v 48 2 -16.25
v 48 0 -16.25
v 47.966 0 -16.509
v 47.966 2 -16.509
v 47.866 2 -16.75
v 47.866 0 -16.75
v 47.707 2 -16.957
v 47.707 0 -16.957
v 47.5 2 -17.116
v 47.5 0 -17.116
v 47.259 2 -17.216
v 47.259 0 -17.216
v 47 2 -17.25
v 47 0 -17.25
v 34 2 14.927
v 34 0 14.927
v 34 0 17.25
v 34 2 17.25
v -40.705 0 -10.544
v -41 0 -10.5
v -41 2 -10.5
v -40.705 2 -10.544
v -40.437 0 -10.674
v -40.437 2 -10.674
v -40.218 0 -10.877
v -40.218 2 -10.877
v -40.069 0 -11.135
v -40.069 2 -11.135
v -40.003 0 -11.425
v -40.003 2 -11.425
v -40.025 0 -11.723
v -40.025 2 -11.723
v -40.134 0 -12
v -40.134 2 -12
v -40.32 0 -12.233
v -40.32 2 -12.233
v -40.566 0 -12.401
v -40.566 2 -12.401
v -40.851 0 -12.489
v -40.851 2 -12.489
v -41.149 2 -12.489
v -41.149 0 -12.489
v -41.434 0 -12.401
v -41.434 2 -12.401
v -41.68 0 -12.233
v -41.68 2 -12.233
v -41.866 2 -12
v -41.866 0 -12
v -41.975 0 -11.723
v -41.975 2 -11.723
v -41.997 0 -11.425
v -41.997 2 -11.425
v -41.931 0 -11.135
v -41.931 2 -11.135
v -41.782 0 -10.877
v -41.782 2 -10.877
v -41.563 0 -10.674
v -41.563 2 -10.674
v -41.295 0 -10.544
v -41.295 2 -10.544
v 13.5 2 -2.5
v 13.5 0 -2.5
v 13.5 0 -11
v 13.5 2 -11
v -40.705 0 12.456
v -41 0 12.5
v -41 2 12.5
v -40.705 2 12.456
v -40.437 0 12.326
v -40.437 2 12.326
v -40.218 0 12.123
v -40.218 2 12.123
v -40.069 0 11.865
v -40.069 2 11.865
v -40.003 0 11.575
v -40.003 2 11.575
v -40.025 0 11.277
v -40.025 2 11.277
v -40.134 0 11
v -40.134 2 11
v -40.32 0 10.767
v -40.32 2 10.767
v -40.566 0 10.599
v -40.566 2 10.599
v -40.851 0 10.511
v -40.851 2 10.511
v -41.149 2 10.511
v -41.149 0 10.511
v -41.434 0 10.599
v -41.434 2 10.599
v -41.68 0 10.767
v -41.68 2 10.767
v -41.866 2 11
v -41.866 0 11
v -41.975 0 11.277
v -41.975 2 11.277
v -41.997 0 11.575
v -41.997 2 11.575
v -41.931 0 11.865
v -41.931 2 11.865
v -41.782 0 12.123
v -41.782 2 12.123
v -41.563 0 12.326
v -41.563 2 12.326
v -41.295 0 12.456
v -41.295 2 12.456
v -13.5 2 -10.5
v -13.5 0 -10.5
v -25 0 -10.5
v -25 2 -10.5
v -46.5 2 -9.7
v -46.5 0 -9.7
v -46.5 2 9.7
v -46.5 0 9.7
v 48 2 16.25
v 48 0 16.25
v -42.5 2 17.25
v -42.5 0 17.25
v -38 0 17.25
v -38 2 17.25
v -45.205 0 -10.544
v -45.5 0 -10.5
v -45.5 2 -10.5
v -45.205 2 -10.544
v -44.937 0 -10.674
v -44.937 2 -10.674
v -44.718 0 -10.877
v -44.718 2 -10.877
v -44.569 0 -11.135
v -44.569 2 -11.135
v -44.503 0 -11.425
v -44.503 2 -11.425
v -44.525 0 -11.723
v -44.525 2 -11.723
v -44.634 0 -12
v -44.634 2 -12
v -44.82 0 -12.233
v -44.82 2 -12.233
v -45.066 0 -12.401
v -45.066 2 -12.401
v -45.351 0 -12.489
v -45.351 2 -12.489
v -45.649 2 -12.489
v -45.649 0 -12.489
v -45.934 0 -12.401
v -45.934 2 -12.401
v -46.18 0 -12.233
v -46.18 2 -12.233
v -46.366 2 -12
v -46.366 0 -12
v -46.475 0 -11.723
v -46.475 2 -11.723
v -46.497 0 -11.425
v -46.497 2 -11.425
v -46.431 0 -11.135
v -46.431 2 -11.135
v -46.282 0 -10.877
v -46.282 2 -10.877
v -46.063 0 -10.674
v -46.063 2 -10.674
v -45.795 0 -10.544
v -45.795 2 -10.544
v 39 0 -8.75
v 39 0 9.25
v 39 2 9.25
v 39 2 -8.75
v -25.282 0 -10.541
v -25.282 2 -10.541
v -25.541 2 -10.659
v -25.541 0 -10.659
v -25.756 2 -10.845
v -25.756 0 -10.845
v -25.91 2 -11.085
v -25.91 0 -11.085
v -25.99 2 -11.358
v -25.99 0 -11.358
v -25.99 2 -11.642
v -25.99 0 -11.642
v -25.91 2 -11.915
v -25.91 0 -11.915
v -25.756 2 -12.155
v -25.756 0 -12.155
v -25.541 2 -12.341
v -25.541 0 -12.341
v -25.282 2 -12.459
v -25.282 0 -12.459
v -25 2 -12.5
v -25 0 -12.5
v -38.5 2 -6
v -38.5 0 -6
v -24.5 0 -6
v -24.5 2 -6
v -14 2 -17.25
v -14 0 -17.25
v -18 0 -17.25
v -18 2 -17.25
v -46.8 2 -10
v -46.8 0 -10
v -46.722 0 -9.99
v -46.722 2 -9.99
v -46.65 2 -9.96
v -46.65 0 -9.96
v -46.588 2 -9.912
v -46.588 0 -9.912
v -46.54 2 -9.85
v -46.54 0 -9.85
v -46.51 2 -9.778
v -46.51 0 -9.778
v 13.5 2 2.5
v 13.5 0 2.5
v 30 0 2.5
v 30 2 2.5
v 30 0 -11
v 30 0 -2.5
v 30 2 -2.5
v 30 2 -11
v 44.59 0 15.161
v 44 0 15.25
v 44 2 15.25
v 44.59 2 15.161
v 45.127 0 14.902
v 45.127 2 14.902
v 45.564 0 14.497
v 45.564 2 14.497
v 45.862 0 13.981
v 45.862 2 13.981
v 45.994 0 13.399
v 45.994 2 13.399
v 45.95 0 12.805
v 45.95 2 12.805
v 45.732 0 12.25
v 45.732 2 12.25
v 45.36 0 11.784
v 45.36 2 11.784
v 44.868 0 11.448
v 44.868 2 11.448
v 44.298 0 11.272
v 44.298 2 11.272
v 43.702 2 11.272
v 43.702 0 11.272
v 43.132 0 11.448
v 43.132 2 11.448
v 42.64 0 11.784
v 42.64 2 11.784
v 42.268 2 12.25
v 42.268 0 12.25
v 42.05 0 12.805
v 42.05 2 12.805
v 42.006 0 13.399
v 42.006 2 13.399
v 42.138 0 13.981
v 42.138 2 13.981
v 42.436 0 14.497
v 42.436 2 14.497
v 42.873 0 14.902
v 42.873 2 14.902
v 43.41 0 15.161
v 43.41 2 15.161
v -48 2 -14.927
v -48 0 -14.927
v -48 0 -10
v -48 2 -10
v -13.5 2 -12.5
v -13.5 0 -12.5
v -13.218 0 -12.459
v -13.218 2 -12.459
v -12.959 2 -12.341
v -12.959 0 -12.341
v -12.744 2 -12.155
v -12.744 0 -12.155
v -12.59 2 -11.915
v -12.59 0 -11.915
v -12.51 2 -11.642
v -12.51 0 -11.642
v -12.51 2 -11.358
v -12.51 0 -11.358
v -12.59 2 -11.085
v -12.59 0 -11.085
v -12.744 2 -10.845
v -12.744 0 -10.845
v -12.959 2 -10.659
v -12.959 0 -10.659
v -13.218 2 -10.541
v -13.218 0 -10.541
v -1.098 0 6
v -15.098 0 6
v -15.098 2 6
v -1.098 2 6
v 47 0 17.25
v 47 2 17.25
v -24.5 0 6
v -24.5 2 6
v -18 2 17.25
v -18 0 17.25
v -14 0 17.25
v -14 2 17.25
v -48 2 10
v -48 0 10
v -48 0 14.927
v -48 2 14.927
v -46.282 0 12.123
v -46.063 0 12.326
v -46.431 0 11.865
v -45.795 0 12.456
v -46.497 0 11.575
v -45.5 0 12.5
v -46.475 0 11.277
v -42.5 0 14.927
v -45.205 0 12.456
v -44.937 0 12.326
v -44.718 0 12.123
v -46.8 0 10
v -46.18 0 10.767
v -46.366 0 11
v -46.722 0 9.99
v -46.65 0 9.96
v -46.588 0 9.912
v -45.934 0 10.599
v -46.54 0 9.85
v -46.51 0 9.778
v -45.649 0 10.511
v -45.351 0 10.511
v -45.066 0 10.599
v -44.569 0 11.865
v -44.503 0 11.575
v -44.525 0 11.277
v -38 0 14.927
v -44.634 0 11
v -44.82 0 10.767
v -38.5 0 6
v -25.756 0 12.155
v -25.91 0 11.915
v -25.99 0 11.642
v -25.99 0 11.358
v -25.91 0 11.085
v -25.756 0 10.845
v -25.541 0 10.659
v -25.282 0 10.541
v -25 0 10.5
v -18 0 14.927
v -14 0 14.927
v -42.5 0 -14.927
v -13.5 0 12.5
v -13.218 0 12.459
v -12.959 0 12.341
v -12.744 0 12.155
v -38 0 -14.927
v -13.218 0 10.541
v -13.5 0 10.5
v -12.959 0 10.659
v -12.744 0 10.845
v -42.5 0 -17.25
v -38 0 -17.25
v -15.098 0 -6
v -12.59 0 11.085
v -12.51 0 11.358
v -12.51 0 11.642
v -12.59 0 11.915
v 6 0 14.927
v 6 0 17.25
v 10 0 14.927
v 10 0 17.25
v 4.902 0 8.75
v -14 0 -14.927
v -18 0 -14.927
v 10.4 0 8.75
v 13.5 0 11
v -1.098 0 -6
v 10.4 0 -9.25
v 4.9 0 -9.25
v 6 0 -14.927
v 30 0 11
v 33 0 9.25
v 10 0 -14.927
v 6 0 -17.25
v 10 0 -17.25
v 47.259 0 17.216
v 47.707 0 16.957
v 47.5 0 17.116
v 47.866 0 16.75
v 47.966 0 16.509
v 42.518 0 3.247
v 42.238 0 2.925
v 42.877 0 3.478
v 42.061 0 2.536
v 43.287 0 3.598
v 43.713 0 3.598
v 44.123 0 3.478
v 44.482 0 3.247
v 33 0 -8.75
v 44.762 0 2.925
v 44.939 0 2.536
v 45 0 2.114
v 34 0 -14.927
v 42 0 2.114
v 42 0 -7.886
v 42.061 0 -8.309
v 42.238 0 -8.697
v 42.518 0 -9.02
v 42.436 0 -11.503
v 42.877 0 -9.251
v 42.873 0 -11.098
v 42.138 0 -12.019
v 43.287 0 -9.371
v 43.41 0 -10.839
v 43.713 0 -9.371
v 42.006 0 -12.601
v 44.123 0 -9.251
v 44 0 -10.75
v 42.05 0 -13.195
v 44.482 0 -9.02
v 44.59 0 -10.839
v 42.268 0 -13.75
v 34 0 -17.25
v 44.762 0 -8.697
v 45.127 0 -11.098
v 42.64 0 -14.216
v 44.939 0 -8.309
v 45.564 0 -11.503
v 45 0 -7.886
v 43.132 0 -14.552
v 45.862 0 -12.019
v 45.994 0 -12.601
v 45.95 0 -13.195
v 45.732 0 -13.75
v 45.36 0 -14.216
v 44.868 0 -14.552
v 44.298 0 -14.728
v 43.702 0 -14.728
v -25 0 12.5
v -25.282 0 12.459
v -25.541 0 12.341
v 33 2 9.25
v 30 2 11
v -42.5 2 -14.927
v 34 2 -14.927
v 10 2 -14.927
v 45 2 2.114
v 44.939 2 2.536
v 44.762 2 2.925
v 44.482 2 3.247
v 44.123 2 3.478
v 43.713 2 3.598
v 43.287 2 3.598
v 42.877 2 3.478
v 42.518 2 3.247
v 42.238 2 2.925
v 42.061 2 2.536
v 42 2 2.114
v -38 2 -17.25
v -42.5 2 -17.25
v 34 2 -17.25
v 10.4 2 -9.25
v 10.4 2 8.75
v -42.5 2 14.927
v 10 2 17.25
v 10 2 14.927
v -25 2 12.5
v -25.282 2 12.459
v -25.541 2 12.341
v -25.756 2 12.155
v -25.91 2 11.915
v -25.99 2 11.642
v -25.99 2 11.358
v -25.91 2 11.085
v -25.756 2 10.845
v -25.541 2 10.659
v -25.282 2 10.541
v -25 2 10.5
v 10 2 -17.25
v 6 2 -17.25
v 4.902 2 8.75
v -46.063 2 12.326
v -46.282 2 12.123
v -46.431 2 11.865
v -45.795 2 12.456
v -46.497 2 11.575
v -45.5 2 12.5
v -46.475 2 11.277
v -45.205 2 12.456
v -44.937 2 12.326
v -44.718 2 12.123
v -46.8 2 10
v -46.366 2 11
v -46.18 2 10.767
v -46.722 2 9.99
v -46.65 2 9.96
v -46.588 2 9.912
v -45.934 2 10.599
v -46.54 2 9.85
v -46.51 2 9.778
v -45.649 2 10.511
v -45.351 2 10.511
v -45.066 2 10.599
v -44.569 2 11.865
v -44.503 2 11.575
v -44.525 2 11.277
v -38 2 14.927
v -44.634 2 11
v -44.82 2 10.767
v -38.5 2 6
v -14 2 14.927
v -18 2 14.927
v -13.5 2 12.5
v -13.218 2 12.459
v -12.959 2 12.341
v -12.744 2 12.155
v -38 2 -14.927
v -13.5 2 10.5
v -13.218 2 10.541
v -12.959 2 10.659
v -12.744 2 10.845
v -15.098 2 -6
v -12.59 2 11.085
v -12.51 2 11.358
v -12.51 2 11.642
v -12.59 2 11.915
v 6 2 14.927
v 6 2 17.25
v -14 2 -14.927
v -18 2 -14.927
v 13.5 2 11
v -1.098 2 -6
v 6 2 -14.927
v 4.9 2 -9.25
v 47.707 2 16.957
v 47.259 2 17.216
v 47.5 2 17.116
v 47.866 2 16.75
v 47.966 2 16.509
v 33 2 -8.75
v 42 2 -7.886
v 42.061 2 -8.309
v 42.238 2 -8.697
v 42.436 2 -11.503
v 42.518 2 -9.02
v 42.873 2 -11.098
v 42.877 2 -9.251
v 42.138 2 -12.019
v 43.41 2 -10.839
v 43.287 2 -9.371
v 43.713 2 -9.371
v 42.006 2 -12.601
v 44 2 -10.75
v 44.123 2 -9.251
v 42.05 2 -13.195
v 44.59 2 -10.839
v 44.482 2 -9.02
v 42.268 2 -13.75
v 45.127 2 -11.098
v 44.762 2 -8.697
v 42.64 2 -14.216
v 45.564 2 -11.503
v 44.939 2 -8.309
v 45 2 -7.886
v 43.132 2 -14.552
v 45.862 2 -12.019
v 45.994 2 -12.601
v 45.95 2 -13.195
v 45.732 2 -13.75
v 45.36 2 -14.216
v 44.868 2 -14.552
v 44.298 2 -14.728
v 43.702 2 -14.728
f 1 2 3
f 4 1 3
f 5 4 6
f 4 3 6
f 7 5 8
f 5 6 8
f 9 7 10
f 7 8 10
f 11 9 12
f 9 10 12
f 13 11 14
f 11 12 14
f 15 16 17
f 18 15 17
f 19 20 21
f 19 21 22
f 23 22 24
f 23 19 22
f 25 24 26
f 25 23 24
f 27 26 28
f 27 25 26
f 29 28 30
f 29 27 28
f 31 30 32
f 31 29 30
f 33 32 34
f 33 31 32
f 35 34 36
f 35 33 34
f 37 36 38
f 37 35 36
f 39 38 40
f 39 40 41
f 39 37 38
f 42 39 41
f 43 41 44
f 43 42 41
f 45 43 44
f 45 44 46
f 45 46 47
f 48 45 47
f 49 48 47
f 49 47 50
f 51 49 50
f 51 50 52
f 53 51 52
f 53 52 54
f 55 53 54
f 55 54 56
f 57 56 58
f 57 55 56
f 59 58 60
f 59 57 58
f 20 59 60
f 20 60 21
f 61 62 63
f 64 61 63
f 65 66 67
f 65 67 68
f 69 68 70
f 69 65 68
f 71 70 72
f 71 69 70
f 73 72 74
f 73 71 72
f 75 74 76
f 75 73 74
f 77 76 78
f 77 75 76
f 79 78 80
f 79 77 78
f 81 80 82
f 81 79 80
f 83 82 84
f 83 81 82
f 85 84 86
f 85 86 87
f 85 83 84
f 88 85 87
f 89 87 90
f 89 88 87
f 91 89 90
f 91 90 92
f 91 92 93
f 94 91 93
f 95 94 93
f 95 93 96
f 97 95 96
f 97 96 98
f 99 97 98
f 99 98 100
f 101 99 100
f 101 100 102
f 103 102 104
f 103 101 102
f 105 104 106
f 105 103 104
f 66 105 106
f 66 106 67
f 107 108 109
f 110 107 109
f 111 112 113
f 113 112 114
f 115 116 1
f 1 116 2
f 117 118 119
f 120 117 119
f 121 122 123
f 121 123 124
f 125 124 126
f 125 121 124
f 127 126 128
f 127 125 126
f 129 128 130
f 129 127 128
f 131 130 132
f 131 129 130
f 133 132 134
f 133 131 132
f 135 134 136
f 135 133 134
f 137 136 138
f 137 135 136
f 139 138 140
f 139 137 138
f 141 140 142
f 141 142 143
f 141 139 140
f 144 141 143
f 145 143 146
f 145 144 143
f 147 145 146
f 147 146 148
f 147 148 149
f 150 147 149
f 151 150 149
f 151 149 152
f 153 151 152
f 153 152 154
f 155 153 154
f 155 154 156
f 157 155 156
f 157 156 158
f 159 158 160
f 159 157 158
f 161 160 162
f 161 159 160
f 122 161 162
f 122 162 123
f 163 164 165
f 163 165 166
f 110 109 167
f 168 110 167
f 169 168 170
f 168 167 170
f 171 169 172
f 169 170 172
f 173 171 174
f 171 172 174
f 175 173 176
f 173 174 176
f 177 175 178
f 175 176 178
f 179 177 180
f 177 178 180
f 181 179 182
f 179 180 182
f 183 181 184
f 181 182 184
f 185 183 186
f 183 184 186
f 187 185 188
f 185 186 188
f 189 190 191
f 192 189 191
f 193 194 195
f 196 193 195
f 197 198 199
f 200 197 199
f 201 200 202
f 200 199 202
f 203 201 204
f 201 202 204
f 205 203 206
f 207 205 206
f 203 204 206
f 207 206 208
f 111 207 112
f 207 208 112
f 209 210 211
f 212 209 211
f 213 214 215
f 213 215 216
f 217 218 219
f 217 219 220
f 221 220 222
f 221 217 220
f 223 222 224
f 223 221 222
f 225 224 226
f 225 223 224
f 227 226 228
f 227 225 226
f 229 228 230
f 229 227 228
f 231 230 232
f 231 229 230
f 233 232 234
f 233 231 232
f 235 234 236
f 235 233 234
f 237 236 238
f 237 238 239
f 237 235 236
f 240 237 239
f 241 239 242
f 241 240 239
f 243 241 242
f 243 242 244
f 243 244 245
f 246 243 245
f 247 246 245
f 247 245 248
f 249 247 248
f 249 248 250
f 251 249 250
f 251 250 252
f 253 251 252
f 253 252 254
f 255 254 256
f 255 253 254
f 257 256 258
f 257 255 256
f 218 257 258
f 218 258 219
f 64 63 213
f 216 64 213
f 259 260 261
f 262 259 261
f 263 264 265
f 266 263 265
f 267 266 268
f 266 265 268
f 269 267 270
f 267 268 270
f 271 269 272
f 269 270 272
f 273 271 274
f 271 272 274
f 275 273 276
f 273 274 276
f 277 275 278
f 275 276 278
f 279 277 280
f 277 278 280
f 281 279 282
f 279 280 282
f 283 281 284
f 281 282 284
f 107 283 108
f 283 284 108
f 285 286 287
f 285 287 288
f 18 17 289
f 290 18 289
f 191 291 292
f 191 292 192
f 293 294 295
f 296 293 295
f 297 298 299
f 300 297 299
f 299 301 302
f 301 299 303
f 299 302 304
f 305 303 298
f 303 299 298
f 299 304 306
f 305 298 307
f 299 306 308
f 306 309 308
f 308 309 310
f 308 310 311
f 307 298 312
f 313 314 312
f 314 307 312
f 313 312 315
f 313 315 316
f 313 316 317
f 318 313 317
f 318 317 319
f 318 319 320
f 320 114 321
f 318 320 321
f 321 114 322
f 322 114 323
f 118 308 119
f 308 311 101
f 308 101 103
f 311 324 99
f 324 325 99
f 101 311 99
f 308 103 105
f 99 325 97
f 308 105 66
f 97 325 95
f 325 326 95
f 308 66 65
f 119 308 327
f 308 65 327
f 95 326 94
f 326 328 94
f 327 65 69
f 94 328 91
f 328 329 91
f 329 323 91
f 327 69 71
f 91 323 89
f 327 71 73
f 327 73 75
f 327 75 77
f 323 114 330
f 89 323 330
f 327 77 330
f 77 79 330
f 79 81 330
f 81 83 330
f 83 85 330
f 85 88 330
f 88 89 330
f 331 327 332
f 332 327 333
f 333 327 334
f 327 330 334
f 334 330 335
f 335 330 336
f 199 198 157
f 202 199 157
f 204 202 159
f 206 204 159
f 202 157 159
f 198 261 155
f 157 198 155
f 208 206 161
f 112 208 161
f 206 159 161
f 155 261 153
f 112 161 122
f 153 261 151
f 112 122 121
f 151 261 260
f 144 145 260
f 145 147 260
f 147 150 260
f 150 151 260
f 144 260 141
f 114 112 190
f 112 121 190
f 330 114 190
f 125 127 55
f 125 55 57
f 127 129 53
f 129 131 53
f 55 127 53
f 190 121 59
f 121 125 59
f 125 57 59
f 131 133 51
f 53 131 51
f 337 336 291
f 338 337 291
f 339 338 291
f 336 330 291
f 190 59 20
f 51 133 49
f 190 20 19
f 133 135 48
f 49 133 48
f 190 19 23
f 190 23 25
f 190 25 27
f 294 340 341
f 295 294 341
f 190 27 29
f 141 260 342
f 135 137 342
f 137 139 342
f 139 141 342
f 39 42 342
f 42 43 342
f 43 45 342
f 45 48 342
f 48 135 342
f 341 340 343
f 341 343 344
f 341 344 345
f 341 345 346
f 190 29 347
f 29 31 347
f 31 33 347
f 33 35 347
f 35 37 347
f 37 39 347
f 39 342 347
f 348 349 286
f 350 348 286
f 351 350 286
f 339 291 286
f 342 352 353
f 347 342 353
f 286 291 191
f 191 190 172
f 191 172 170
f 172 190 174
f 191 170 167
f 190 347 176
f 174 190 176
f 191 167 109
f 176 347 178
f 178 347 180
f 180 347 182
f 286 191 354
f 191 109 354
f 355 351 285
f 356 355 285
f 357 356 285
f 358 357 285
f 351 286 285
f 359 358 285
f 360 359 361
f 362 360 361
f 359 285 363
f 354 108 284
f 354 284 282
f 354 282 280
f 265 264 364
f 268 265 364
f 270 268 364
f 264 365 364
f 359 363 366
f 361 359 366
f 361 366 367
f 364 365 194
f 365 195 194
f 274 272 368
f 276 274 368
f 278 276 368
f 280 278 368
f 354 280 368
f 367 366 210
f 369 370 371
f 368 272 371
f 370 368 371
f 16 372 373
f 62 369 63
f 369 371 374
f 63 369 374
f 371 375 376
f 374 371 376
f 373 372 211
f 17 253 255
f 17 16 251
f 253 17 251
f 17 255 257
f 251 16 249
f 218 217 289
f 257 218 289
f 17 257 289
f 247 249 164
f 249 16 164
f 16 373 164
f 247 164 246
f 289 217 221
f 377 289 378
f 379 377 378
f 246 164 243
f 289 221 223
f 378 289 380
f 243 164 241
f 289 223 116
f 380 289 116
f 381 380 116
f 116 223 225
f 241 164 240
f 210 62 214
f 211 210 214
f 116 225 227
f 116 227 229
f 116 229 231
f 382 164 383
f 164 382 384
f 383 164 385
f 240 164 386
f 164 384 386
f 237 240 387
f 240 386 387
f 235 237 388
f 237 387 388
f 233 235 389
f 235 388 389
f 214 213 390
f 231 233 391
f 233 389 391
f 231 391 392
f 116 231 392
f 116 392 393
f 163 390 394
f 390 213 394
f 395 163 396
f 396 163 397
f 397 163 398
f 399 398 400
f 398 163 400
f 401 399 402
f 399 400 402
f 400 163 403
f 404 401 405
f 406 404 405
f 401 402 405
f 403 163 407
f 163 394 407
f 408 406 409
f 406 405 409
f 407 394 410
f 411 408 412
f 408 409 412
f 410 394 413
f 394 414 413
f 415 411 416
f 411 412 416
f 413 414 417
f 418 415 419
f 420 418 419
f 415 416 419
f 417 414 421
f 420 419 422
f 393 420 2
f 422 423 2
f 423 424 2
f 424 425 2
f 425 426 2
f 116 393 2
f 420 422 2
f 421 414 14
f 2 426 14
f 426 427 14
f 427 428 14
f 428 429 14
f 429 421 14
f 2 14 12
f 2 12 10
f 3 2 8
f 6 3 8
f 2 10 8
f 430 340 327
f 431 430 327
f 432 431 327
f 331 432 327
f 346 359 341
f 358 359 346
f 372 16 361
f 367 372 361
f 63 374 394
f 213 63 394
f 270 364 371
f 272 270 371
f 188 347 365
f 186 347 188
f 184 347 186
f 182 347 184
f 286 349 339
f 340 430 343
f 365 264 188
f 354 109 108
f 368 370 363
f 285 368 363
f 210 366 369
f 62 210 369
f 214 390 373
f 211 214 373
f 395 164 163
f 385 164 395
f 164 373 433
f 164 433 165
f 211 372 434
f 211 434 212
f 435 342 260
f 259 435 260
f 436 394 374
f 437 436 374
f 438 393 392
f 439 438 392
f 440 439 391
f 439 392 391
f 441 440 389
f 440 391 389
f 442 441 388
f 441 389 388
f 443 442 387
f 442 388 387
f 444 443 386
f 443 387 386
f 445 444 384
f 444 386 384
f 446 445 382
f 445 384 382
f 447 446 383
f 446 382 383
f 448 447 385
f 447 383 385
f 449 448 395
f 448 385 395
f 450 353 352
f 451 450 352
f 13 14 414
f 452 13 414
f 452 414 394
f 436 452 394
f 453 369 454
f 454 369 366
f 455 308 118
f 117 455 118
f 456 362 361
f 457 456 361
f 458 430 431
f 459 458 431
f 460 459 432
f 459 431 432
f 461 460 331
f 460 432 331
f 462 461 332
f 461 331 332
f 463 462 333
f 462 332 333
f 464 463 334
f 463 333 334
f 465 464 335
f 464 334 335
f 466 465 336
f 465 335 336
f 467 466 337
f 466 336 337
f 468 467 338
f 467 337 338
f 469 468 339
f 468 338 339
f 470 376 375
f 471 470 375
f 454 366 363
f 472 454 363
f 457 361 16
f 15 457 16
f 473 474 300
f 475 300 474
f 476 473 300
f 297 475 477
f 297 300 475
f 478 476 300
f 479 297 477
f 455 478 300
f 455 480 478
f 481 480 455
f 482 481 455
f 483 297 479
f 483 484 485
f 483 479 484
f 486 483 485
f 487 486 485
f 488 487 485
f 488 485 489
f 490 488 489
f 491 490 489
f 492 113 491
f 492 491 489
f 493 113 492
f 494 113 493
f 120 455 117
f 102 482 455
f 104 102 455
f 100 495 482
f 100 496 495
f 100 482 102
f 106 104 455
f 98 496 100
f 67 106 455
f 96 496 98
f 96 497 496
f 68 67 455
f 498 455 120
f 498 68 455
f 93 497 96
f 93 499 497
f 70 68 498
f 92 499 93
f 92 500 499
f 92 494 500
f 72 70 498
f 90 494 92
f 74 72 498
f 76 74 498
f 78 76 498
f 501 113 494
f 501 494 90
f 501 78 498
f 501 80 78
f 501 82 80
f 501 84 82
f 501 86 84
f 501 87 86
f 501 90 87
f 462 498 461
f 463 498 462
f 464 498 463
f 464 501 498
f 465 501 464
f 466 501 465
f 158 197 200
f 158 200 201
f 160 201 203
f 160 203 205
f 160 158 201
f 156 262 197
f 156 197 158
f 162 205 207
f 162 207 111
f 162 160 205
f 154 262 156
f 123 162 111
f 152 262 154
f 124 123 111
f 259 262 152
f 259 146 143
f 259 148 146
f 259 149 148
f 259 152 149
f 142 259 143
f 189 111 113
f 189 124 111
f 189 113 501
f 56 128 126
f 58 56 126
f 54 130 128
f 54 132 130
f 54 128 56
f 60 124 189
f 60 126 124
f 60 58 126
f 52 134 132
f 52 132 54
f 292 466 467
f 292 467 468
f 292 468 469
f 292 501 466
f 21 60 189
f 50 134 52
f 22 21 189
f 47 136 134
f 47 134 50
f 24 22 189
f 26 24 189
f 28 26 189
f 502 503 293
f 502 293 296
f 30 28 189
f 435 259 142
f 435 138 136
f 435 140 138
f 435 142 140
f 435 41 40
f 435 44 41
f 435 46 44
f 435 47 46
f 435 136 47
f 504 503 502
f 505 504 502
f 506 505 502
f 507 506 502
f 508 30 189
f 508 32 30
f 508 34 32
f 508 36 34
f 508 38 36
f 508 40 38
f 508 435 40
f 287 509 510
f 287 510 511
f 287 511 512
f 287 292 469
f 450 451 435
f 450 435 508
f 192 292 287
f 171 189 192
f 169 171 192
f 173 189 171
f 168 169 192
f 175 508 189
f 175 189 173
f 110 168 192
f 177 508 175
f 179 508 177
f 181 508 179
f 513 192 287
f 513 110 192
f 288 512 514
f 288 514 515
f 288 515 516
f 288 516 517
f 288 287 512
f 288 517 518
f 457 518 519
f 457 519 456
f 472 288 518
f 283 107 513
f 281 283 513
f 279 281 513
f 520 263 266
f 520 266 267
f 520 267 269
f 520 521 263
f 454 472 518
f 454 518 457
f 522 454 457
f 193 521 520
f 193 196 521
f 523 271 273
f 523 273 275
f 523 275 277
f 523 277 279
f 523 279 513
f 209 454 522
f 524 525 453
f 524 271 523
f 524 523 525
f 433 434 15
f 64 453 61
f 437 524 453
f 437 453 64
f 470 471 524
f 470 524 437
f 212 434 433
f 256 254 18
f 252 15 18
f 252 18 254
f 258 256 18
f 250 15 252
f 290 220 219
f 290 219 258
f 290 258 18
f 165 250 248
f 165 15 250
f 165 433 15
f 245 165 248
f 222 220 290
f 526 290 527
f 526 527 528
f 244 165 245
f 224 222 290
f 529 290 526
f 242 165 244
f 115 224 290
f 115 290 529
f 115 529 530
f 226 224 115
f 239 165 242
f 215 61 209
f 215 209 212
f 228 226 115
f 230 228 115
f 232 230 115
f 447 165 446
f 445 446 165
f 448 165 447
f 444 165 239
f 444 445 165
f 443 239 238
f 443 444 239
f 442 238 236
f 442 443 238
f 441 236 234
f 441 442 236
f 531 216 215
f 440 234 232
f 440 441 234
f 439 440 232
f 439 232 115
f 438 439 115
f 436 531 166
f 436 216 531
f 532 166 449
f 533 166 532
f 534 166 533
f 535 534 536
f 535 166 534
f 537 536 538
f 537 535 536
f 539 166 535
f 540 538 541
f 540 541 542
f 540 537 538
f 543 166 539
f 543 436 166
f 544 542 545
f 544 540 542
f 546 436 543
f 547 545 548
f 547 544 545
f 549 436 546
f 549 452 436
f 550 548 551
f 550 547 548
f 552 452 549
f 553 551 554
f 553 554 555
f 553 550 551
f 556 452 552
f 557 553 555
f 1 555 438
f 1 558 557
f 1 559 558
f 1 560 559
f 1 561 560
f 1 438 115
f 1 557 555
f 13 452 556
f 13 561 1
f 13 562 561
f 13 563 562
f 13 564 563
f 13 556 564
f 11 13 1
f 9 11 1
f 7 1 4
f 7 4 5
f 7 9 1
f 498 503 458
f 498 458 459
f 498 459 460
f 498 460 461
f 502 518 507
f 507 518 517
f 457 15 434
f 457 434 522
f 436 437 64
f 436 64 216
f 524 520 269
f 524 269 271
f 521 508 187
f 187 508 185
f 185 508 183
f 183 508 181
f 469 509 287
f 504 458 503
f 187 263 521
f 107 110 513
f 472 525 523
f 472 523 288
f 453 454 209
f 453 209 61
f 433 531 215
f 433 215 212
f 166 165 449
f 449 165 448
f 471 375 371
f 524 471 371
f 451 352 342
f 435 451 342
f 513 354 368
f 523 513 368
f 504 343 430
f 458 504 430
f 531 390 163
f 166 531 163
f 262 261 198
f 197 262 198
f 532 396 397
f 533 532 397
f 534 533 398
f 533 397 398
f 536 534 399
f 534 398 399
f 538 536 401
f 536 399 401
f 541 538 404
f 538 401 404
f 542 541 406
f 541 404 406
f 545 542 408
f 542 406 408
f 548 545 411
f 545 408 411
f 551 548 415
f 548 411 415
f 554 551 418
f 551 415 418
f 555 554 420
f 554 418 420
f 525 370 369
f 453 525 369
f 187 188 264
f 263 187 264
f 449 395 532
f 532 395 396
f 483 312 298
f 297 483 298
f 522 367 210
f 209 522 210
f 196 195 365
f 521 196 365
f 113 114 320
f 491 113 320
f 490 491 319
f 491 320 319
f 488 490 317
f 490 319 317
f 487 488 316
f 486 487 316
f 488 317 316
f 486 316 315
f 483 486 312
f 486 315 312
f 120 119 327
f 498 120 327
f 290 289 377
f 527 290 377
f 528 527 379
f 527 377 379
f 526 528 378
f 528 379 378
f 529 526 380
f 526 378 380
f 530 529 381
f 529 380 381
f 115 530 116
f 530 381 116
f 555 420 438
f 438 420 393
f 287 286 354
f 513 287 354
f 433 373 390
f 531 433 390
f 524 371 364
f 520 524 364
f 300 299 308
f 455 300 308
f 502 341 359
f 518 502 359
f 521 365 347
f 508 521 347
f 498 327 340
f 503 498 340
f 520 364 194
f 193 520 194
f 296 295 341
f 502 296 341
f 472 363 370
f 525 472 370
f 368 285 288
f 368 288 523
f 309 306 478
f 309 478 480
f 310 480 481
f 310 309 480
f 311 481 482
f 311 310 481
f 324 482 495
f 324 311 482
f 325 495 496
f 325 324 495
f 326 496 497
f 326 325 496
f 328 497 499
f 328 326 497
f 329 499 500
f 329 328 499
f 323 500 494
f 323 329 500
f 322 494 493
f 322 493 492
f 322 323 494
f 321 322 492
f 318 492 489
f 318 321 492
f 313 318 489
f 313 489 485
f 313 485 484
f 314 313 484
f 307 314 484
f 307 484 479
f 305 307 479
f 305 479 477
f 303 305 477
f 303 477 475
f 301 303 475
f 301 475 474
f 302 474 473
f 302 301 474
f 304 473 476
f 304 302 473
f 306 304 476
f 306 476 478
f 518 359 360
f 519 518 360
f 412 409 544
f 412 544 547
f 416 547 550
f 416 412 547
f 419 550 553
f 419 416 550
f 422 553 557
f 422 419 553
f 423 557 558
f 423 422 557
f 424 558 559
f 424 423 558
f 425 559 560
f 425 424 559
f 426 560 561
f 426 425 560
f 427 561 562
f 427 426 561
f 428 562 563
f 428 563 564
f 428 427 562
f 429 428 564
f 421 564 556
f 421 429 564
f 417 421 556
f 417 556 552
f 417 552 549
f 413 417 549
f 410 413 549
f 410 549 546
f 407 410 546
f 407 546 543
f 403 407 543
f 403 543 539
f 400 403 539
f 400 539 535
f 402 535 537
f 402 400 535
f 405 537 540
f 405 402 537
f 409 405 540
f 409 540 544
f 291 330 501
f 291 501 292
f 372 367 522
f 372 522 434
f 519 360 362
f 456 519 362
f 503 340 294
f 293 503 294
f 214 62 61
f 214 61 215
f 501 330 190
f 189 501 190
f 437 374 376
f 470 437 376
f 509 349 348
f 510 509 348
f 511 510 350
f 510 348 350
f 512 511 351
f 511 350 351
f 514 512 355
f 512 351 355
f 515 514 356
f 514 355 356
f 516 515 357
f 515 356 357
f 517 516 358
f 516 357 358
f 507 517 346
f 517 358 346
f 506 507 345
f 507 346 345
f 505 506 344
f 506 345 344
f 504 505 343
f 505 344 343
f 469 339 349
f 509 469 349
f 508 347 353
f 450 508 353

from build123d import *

# Parameters (mm, degrees)
TOP_PLATE_R             = 1
TOP_PLATE_R_2           = 2
TOP_PLATE_W             = 16.5
TOP_PLATE_H             = 8.5
TOP_PLATE_W_2           = 6
TOP_PLATE_H_2           = 18
TOP_PLATE_W_3           = 14
TOP_PLATE_H_3           = 12
TOP_PLATE_EXTRUDE_DEPTH = 2


with BuildPart() as part:
    # Top Plate → Top Plate Extrude (new body)
    with BuildSketch(Plane(origin=(0, 0, 0), x_dir=(1, 0, 0), z_dir=(0, 1, 0))):
        with BuildLine():
            Line((-38, 17.25), (-42.5, 17.25))
            Line((-42.5, 17.25), (-42.5, 14.926611549))
            Line((-42.5, 14.926611549), (-48, 14.926611549))
            Line((-48, 14.926611549), (-48, 10))
            Line((-48, 10), (-46.8, 10))
            ThreePointArc((-46.8, 10), (-46.587867966, 9.912132034), (-46.5, 9.7))
            Line((-46.5, 9.7), (-46.5, -9.7))
            ThreePointArc((-46.5, -9.7), (-46.587867966, -9.912132034), (-46.8, -10))
            Line((-46.8, -10), (-48, -10))
            Line((-48, -10), (-48, -14.926611549))
            Line((-48, -14.926611549), (-42.5, -14.926611549))
            Line((-42.5, -14.926611549), (-42.5, -17.25))
            Line((-42.5, -17.25), (-38, -17.25))
            Line((-38, -17.25), (-38, -14.926611549))
            Line((-38, -14.926611549), (-18, -14.926611549))
            Line((-18, -14.926611549), (-18, -17.25))
            Line((-18, -17.25), (-14, -17.25))
            Line((-14, -17.25), (-14, -14.926611549))
            Line((-14, -14.926611549), (6, -14.926611549))
            Line((6, -14.926611549), (6, -17.25))
            Line((6, -17.25), (10, -17.25))
            Line((10, -17.25), (10, -14.926611549))
            Line((10, -14.926611549), (34, -14.926611549))
            Line((34, -14.926611549), (34, -17.25))
            Line((34, -17.25), (47, -17.25))
            ThreePointArc((47, -17.25), (47.707106781, -16.957106781), (48, -16.25))
            Line((48, -16.25), (48, 16.25))
            ThreePointArc((48, 16.25), (47.707106781, 16.957106781), (47, 17.25))
            Line((47, 17.25), (34, 17.25))
            Line((34, 17.25), (34, 14.926611549))
            Line((34, 14.926611549), (10, 14.926611549))
            Line((10, 14.926611549), (10, 17.25))
            Line((10, 17.25), (6, 17.25))
            Line((6, 17.25), (6, 14.926611549))
            Line((6, 14.926611549), (-14, 14.926611549))
            Line((-14, 14.926611549), (-14, 17.25))
            Line((-14, 17.25), (-18, 17.25))
            Line((-18, 17.25), (-18, 14.926611549))
            Line((-18, 14.926611549), (-38, 14.926611549))
            Line((-38, 14.926611549), (-38, 17.25))
        make_face()
        with Locations(Location((-45.5, -11.5, 0), (0, 0, 270))):
            Circle(TOP_PLATE_R, mode=Mode.SUBTRACT)
        with Locations(Location((-41, -11.5, 0), (0, 0, 270))):
            Circle(TOP_PLATE_R, mode=Mode.SUBTRACT)
        with BuildLine():
            Line((-25, -10.5), (-13.5, -10.5))
            ThreePointArc((-13.5, -10.5), (-12.5, -11.5), (-13.5, -12.5))
            Line((-13.5, -12.5), (-25, -12.5))
            ThreePointArc((-25, -12.5), (-26, -11.5), (-25, -10.5))
        make_face(mode=Mode.SUBTRACT)
        with Locations(Location((44, -13.25, 0), (0, 0, 270))):
            Circle(TOP_PLATE_R_2, mode=Mode.SUBTRACT)
        with Locations((21.75, -6.75)):
            Rectangle(TOP_PLATE_W, TOP_PLATE_H, mode=Mode.SUBTRACT)
        with Locations((36, -0.25)):
            Rectangle(TOP_PLATE_W_2, TOP_PLATE_H_2, mode=Mode.SUBTRACT)
        with Locations((-31.5, 0)):
            Rectangle(TOP_PLATE_W_3, TOP_PLATE_H_3, mode=Mode.SUBTRACT)
        with Locations((-8.098292563, 0)):
            Rectangle(TOP_PLATE_W_3, TOP_PLATE_H_3, mode=Mode.SUBTRACT)
        with Locations(Location((-45.5, 11.5, 0), (0, 0, 270))):
            Circle(TOP_PLATE_R, mode=Mode.SUBTRACT)
        with Locations(Location((-41, 11.5, 0), (0, 0, 270))):
            Circle(TOP_PLATE_R, mode=Mode.SUBTRACT)
        with BuildLine():
            ThreePointArc((-13.5, 12.5), (-12.5, 11.5), (-13.5, 10.5))
            Line((-13.5, 10.5), (-25, 10.5))
            ThreePointArc((-25, 10.5), (-26, 11.5), (-25, 12.5))
            Line((-25, 12.5), (-13.5, 12.5))
        make_face(mode=Mode.SUBTRACT)
        Polygon((4.9, 9.249999917), (10.4, 9.249999917), (10.4, -8.75), (4.901707437, -8.750000002), align=None, mode=Mode.SUBTRACT)
        with Locations((21.75, 6.75)):
            Rectangle(TOP_PLATE_W, TOP_PLATE_H, mode=Mode.SUBTRACT)
        with BuildLine():
            ThreePointArc((42, 7.886262649), (43.5, 9.386262649), (45, 7.886262649))
            Line((45, 7.886262649), (45, -2.113737351))
            ThreePointArc((45, -2.113737351), (43.5, -3.613737351), (42, -2.113737351))
            Line((42, -2.113737351), (42, 7.886262649))
        make_face(mode=Mode.SUBTRACT)
        with Locations(Location((44, 12.75, 0), (0, 0, 270))):
            Circle(TOP_PLATE_R_2, mode=Mode.SUBTRACT)
    extrude(amount=TOP_PLATE_EXTRUDE_DEPTH)


solid = part.part
